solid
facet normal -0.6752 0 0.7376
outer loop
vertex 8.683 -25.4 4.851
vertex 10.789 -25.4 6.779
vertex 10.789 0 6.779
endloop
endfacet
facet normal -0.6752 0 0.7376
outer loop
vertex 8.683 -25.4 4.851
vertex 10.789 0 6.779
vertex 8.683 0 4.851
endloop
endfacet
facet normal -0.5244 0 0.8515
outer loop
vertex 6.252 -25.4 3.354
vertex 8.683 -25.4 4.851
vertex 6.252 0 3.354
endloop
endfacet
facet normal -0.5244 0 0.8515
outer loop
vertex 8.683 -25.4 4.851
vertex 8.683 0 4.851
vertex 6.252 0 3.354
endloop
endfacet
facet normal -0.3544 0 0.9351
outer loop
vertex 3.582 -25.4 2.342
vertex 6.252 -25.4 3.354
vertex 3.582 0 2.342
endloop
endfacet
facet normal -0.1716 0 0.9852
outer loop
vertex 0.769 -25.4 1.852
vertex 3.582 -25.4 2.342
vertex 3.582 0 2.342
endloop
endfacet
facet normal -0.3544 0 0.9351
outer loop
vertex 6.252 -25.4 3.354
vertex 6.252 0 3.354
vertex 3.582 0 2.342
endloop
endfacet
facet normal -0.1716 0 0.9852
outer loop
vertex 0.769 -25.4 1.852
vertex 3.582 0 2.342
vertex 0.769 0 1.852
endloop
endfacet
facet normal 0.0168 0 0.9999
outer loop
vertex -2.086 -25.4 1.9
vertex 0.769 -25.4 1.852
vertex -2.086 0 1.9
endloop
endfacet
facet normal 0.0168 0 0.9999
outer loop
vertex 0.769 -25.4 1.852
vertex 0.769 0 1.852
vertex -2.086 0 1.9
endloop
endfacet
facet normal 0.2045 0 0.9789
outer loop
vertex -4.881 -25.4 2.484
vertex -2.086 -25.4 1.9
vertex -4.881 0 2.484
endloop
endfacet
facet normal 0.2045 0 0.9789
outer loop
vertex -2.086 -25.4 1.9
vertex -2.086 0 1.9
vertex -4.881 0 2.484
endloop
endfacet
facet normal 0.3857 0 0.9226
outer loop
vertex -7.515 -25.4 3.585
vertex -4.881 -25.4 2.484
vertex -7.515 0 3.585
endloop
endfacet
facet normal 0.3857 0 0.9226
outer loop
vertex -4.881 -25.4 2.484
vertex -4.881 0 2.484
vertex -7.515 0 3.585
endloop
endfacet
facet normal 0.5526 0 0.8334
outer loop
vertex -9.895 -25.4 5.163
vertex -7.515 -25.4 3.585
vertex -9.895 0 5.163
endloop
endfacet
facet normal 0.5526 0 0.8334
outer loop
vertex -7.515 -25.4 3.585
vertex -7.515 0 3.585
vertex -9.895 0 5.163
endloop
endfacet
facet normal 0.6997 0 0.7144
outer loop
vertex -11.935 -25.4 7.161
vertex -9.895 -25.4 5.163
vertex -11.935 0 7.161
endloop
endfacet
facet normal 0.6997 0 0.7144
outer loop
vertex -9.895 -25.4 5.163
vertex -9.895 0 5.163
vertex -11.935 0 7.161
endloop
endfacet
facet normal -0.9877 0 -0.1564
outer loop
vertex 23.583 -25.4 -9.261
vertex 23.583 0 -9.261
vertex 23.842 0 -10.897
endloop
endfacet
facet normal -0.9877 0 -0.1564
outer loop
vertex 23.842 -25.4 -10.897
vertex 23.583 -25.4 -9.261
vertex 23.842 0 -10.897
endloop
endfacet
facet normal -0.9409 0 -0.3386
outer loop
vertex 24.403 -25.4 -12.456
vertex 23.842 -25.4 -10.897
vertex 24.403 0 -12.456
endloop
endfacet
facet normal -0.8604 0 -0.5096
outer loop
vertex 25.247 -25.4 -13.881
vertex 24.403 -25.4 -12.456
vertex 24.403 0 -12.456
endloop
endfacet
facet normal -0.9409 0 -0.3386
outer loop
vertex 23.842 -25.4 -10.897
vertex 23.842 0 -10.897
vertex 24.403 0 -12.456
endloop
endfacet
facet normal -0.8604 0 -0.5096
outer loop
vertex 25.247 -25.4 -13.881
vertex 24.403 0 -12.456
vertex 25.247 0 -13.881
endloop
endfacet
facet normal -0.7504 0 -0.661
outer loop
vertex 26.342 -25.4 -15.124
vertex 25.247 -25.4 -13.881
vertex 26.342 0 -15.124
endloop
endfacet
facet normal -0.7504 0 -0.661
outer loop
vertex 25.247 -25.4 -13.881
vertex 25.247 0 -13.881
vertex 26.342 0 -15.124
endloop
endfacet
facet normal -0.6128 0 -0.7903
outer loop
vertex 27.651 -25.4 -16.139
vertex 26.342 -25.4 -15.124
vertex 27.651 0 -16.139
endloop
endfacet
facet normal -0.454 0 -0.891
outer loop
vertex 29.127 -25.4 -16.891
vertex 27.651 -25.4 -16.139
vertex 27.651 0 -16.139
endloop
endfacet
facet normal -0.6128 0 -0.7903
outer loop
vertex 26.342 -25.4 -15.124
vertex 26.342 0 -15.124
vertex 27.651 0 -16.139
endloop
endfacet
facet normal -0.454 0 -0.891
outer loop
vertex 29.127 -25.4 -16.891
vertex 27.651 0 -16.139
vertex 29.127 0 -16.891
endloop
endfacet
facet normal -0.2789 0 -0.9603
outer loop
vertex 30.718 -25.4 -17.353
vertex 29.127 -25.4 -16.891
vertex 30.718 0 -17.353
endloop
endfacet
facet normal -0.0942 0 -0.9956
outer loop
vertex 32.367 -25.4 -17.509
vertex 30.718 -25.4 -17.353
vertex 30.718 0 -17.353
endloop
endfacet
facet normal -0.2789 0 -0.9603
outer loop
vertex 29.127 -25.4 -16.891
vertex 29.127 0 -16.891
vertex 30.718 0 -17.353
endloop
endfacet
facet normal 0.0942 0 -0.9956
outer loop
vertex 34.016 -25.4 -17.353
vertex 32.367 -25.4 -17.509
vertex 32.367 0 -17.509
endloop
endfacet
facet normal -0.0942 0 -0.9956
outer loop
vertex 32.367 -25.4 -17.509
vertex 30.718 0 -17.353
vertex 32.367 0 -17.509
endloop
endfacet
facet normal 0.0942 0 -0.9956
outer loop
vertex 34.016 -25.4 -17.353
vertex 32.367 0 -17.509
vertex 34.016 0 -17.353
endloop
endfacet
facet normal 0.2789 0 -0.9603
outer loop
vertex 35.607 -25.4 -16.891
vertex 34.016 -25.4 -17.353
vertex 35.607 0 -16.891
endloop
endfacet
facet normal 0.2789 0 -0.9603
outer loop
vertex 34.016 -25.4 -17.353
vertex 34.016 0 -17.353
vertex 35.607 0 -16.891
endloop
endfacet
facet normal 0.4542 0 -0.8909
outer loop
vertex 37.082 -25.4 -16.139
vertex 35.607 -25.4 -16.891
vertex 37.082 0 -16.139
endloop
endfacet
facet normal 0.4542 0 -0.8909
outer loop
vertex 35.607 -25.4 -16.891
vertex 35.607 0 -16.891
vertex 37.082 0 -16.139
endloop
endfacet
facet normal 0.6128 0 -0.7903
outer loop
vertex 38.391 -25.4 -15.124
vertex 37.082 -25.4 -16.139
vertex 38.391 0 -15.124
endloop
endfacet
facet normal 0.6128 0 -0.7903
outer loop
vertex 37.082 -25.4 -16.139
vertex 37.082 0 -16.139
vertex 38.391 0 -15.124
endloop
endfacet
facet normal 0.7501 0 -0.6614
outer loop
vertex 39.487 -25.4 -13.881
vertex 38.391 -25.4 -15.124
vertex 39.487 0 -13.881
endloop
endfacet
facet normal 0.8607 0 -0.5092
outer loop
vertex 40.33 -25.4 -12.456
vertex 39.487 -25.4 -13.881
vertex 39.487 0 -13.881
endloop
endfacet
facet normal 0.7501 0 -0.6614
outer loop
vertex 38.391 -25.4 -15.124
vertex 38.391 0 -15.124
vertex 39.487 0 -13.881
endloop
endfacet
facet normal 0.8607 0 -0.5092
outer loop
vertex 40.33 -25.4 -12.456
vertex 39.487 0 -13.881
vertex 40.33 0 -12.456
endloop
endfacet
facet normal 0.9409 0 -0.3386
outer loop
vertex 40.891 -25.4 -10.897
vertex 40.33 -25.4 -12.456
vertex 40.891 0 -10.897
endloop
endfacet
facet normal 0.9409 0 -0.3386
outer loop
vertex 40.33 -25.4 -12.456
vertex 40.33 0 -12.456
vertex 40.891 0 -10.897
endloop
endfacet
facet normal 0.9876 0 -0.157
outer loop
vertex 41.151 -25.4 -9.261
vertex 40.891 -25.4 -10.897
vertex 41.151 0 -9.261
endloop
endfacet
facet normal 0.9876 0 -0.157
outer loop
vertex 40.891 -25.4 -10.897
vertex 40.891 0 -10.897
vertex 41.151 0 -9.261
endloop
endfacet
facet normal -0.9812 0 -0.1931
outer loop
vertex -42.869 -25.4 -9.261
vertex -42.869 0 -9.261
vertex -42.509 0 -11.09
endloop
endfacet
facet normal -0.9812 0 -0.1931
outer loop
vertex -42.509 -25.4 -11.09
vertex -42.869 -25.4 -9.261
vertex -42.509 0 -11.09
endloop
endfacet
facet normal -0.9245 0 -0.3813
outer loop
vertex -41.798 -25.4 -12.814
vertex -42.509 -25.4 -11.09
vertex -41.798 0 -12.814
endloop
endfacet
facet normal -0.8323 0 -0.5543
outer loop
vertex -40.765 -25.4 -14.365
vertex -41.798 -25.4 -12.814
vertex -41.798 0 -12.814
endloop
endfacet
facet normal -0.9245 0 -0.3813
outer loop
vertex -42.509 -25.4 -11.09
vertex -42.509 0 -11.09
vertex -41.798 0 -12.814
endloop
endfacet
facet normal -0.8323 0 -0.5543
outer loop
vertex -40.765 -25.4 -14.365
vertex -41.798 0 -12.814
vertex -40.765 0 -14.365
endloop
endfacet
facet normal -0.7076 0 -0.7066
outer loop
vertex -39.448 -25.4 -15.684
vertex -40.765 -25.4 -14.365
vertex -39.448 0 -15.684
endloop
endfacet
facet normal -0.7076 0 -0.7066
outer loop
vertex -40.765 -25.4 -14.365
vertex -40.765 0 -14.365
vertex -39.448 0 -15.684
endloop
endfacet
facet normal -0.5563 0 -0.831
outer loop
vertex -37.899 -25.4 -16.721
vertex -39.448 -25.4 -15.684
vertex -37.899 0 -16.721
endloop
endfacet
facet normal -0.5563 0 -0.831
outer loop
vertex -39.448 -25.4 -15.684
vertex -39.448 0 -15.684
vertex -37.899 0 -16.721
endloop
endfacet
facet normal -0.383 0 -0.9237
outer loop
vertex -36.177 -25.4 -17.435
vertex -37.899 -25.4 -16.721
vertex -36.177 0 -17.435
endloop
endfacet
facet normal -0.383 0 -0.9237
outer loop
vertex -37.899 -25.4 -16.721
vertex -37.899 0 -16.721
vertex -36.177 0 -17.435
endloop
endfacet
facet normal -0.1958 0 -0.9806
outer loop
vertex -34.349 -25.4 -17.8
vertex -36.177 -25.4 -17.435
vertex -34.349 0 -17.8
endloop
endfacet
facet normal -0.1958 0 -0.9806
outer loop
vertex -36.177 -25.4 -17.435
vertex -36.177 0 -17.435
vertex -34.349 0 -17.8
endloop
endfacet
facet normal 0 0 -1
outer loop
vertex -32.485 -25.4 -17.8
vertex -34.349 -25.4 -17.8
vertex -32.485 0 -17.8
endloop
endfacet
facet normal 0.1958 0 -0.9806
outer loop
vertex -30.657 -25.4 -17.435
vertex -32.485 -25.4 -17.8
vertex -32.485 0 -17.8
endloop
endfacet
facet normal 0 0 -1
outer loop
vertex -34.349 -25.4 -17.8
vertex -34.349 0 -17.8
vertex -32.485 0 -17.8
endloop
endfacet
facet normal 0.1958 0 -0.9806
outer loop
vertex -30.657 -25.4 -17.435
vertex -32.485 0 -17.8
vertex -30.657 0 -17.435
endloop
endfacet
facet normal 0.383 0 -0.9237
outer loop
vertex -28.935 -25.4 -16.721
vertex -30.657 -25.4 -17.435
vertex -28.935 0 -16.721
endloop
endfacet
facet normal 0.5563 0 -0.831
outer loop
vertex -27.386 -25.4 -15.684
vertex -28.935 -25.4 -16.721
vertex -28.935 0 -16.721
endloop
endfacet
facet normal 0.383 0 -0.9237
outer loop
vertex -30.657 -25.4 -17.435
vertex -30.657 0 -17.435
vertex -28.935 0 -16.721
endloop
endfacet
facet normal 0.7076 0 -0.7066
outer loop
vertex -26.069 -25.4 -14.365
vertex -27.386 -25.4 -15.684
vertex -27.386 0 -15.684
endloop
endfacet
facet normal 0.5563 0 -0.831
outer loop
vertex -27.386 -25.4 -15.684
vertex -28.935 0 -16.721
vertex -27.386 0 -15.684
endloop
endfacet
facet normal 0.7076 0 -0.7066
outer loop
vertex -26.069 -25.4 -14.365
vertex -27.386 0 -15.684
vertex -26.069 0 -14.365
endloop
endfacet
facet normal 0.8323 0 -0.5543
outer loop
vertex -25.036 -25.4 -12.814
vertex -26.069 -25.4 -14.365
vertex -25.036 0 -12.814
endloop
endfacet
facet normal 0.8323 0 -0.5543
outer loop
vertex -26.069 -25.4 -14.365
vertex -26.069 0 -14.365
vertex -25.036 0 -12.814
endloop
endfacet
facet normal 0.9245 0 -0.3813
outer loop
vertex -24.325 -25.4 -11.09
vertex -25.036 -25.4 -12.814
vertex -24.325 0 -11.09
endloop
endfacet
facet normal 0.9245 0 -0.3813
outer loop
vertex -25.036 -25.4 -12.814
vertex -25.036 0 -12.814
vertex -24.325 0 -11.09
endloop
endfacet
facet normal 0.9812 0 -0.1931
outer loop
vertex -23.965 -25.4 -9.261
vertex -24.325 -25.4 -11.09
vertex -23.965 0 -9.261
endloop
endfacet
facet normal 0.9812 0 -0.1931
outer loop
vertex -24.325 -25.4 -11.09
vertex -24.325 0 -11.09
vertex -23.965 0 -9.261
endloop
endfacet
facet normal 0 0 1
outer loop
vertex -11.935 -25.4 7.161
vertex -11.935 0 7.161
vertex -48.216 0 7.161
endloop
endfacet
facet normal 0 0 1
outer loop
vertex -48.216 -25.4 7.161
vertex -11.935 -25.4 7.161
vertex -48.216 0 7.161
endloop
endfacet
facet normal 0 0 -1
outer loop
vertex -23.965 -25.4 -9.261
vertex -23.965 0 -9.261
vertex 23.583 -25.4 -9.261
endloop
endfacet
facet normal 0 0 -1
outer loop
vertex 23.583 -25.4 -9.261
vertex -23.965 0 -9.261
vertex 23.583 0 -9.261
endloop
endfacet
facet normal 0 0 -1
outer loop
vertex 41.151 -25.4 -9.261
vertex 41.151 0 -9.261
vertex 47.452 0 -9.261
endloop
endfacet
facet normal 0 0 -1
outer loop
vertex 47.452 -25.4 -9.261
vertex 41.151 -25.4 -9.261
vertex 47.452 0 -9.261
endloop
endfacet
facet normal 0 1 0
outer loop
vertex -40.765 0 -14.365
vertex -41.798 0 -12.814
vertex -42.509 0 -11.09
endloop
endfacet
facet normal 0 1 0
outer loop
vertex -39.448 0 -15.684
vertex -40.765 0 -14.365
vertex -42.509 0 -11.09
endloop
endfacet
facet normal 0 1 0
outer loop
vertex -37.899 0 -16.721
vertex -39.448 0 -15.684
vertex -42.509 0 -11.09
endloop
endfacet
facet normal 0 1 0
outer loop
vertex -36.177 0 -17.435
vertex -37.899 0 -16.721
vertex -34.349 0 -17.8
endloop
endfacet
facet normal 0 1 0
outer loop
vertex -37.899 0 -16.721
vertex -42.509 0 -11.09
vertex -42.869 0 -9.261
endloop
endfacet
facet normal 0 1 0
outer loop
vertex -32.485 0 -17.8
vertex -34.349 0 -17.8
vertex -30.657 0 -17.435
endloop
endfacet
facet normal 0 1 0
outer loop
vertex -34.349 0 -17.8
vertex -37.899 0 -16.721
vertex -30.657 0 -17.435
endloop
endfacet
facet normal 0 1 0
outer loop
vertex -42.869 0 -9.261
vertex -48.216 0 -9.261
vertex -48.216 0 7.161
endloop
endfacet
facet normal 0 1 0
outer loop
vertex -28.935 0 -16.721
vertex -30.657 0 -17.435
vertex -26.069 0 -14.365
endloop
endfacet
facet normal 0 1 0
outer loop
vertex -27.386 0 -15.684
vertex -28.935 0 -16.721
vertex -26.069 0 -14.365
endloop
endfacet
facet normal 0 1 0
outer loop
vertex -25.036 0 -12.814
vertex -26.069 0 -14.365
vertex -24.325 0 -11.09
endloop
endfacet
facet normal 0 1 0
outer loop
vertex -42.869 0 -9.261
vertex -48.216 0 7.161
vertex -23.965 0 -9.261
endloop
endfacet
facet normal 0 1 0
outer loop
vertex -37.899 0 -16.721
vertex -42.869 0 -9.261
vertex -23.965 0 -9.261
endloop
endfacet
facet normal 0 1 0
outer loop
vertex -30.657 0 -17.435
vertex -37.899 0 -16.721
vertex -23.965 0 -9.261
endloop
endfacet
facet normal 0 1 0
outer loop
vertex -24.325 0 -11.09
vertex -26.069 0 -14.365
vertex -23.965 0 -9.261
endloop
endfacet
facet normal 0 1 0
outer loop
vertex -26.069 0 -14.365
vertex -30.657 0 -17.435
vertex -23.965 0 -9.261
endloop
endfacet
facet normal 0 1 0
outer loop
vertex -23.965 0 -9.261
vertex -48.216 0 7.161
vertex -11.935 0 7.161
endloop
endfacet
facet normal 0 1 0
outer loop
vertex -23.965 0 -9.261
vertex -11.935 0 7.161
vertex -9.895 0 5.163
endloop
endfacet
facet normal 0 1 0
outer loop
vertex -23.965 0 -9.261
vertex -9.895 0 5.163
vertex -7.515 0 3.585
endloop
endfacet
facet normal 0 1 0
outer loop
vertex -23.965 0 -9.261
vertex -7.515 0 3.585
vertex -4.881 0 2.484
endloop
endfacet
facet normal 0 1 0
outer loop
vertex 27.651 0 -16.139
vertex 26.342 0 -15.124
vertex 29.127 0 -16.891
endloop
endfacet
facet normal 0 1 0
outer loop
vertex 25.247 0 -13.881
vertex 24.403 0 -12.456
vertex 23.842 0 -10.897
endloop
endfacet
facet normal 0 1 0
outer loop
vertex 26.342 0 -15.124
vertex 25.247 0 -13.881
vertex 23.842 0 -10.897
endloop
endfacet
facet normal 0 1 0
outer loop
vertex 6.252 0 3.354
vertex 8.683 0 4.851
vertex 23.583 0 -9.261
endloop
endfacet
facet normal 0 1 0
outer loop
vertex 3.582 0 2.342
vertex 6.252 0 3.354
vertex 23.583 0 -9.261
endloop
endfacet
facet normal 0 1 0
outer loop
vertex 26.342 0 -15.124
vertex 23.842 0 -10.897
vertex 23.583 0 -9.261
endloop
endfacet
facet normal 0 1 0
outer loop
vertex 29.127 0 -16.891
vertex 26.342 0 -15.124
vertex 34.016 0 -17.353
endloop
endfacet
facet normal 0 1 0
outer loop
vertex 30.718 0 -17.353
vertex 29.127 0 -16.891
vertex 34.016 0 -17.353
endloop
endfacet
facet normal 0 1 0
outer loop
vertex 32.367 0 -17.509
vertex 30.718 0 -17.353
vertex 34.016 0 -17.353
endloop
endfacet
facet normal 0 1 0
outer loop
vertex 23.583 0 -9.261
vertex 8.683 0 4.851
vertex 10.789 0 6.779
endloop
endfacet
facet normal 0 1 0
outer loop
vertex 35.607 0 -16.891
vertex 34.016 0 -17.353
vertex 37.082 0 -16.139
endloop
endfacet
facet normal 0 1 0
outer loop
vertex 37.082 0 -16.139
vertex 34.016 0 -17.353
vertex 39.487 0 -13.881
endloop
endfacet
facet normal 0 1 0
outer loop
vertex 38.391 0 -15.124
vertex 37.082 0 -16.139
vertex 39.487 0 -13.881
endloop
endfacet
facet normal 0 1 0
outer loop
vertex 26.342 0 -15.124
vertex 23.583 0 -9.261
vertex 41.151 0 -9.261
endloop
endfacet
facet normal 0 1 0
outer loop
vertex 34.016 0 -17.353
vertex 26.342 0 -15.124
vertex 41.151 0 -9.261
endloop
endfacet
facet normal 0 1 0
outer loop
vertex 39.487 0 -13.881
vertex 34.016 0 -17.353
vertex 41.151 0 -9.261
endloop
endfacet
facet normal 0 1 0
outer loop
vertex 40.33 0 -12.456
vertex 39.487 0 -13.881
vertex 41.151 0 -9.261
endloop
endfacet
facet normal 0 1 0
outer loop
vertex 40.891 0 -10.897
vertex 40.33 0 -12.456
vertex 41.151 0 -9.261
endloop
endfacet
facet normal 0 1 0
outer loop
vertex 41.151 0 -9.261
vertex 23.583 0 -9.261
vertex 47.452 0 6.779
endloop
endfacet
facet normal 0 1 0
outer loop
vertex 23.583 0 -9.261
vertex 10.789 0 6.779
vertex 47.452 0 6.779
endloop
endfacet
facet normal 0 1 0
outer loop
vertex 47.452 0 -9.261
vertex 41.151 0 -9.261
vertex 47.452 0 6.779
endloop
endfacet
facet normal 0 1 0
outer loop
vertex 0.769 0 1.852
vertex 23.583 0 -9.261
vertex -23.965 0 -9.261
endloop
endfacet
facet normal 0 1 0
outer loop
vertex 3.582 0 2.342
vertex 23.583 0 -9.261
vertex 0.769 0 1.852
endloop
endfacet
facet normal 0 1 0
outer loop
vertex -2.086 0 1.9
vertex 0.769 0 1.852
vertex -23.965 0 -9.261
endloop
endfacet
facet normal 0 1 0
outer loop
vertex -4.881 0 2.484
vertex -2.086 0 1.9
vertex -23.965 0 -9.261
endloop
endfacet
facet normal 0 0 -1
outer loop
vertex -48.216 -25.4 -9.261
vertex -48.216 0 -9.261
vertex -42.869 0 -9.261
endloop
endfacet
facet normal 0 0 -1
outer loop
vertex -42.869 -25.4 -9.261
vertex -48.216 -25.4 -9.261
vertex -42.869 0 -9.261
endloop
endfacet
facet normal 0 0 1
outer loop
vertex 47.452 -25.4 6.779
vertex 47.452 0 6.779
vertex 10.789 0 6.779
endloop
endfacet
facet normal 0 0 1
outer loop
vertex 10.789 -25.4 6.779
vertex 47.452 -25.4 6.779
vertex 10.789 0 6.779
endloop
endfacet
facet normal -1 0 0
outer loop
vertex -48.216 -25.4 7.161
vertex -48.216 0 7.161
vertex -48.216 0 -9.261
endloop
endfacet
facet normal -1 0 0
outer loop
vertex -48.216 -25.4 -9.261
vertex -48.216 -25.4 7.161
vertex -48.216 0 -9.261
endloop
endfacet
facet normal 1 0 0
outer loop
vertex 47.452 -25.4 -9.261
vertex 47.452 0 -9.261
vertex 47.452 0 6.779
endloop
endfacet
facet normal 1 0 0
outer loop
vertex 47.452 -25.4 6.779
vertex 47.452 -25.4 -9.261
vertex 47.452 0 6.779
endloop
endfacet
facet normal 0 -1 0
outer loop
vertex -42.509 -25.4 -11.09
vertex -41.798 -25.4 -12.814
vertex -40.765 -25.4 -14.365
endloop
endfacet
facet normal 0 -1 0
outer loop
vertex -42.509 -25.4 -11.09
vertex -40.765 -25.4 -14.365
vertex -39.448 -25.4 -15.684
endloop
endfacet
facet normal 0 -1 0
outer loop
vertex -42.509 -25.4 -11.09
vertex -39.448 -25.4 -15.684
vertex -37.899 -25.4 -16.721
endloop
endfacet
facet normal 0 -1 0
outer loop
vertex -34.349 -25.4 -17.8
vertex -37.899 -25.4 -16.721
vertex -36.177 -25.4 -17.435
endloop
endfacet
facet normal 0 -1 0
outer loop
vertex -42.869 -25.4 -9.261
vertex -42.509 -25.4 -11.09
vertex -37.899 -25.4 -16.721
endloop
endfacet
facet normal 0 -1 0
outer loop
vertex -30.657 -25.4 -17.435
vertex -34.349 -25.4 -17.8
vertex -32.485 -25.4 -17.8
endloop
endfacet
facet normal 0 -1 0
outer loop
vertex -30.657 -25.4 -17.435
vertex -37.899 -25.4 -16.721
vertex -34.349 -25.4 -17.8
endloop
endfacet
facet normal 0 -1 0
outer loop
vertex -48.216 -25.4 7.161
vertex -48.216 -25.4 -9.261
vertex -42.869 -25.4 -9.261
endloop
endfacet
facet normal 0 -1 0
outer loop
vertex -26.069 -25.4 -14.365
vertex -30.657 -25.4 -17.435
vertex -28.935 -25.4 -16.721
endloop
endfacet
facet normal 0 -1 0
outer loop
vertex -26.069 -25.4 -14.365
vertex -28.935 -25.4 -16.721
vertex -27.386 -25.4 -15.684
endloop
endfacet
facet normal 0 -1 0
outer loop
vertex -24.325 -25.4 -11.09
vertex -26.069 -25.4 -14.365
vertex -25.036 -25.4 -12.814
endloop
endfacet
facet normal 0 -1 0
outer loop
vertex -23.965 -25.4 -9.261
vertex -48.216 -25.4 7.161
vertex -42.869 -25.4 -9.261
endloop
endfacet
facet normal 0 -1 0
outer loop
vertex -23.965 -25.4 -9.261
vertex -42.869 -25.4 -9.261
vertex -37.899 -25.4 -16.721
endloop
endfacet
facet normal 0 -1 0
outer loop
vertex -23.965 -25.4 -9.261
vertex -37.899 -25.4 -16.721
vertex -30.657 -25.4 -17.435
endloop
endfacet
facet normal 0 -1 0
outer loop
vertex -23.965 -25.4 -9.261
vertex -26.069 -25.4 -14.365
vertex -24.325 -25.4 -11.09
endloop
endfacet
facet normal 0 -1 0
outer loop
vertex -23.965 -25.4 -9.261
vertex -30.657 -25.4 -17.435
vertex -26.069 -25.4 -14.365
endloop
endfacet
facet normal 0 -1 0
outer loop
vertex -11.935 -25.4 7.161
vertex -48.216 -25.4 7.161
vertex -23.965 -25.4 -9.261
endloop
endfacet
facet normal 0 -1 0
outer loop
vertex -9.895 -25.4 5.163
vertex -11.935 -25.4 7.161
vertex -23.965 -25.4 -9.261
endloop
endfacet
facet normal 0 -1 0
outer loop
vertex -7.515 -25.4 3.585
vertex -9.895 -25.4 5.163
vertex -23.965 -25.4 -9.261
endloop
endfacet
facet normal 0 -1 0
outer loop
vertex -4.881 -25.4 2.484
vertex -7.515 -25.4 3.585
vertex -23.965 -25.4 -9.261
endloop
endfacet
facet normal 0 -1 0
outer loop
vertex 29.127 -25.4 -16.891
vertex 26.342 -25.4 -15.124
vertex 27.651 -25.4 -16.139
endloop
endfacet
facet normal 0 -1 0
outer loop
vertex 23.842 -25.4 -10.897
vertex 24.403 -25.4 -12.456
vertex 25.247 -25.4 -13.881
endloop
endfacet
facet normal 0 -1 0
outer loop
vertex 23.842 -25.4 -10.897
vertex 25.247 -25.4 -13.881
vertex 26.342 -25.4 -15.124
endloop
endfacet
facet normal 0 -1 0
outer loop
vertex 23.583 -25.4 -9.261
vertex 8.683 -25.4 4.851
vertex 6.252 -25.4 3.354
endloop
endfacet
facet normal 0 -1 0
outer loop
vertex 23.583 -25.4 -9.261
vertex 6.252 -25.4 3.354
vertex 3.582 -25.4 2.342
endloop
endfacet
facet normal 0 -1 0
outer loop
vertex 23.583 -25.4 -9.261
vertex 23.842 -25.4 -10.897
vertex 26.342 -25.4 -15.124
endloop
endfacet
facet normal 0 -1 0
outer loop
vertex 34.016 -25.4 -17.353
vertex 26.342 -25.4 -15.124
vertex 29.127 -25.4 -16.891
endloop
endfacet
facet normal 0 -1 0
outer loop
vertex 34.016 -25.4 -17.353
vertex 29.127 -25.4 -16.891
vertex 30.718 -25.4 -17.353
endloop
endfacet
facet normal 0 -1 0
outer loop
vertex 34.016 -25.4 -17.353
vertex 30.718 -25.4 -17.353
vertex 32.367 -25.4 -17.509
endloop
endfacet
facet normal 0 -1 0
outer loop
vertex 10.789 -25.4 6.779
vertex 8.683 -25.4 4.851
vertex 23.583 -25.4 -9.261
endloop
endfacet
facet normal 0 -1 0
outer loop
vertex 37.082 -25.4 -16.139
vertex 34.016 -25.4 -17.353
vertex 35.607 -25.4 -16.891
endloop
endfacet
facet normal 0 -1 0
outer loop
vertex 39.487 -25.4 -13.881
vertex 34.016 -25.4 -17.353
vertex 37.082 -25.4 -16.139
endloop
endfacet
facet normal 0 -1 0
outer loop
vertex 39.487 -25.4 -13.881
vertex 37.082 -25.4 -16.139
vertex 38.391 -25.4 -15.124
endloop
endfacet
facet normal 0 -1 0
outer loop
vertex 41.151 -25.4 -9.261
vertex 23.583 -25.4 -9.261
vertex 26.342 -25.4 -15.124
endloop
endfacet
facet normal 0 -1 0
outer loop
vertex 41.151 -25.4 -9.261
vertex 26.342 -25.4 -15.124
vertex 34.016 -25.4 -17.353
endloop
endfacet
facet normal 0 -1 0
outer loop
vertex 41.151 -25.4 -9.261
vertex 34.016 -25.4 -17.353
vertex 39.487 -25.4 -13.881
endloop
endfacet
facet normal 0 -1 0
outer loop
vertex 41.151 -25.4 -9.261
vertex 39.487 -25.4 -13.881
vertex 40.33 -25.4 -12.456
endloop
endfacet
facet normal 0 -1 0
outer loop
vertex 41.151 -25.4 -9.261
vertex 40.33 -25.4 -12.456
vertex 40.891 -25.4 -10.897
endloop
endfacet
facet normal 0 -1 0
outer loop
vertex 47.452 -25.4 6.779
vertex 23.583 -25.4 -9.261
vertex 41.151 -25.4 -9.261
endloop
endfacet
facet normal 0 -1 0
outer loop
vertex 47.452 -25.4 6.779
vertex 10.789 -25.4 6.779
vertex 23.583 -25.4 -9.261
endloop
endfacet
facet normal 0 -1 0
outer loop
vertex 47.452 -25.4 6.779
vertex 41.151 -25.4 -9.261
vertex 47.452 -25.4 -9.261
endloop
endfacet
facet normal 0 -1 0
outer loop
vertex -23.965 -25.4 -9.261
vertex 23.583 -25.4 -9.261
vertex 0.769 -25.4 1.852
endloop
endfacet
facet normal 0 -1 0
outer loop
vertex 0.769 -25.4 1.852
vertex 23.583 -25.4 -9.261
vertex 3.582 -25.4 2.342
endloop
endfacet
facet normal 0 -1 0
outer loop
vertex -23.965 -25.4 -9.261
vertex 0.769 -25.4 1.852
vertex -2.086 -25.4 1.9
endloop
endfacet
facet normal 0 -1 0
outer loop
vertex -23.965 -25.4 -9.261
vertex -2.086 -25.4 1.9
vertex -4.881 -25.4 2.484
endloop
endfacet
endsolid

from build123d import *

# Parameters (mm, degrees)
F1_DEPTH = 25.4


with BuildPart() as f1:
    # F0 (on Front) → F1 (new body)
    with BuildSketch(Plane.XZ):
        with BuildLine():
            Line((47.452234, -9.261301), (47.452234, 6.77889))
            Line((47.452234, 6.77889), (16.51758, 6.77889))
            Line((16.51758, 6.77889), (10.788937, 6.77889))
            ThreePointArc((10.788937, 6.77889), (-0.65962, 1.80786), (-11.934666, 7.160799))
            Line((-11.934666, 7.160799), (-17.663306, 7.160799))
            Line((-17.663306, 7.160799), (-48.216049, 7.160799))
            Line((-48.216049, 7.160799), (-48.216049, -9.261301))
            Line((-48.216049, -9.261301), (-42.869318, -9.261301))
            ThreePointArc((-42.869318, -9.261301), (-33.417064, -4.032086), (-23.964809, -9.261301))
            Line((-23.964809, -9.261301), (23.582902, -9.261301))
            ThreePointArc((23.582902, -9.261301), (32.366816, -4.289359), (41.15073, -9.261301))
            Line((41.15073, -9.261301), (47.452234, -9.261301))
        make_face()
        with BuildLine():
            ThreePointArc((23.582902, -9.261301), (32.366816, -17.508878), (41.15073, -9.261301))
            ThreePointArc((41.15073, -9.261301), (32.366816, -4.289359), (23.582902, -9.261301))
        make_face()
        with BuildLine():
            ThreePointArc((-42.869318, -9.261301), (-33.417064, -17.845475), (-23.964809, -9.261301))
            ThreePointArc((-23.964809, -9.261301), (-33.417064, -4.032086), (-42.869318, -9.261301))
        make_face()
    extrude(amount=F1_DEPTH)


solid = f1.part
